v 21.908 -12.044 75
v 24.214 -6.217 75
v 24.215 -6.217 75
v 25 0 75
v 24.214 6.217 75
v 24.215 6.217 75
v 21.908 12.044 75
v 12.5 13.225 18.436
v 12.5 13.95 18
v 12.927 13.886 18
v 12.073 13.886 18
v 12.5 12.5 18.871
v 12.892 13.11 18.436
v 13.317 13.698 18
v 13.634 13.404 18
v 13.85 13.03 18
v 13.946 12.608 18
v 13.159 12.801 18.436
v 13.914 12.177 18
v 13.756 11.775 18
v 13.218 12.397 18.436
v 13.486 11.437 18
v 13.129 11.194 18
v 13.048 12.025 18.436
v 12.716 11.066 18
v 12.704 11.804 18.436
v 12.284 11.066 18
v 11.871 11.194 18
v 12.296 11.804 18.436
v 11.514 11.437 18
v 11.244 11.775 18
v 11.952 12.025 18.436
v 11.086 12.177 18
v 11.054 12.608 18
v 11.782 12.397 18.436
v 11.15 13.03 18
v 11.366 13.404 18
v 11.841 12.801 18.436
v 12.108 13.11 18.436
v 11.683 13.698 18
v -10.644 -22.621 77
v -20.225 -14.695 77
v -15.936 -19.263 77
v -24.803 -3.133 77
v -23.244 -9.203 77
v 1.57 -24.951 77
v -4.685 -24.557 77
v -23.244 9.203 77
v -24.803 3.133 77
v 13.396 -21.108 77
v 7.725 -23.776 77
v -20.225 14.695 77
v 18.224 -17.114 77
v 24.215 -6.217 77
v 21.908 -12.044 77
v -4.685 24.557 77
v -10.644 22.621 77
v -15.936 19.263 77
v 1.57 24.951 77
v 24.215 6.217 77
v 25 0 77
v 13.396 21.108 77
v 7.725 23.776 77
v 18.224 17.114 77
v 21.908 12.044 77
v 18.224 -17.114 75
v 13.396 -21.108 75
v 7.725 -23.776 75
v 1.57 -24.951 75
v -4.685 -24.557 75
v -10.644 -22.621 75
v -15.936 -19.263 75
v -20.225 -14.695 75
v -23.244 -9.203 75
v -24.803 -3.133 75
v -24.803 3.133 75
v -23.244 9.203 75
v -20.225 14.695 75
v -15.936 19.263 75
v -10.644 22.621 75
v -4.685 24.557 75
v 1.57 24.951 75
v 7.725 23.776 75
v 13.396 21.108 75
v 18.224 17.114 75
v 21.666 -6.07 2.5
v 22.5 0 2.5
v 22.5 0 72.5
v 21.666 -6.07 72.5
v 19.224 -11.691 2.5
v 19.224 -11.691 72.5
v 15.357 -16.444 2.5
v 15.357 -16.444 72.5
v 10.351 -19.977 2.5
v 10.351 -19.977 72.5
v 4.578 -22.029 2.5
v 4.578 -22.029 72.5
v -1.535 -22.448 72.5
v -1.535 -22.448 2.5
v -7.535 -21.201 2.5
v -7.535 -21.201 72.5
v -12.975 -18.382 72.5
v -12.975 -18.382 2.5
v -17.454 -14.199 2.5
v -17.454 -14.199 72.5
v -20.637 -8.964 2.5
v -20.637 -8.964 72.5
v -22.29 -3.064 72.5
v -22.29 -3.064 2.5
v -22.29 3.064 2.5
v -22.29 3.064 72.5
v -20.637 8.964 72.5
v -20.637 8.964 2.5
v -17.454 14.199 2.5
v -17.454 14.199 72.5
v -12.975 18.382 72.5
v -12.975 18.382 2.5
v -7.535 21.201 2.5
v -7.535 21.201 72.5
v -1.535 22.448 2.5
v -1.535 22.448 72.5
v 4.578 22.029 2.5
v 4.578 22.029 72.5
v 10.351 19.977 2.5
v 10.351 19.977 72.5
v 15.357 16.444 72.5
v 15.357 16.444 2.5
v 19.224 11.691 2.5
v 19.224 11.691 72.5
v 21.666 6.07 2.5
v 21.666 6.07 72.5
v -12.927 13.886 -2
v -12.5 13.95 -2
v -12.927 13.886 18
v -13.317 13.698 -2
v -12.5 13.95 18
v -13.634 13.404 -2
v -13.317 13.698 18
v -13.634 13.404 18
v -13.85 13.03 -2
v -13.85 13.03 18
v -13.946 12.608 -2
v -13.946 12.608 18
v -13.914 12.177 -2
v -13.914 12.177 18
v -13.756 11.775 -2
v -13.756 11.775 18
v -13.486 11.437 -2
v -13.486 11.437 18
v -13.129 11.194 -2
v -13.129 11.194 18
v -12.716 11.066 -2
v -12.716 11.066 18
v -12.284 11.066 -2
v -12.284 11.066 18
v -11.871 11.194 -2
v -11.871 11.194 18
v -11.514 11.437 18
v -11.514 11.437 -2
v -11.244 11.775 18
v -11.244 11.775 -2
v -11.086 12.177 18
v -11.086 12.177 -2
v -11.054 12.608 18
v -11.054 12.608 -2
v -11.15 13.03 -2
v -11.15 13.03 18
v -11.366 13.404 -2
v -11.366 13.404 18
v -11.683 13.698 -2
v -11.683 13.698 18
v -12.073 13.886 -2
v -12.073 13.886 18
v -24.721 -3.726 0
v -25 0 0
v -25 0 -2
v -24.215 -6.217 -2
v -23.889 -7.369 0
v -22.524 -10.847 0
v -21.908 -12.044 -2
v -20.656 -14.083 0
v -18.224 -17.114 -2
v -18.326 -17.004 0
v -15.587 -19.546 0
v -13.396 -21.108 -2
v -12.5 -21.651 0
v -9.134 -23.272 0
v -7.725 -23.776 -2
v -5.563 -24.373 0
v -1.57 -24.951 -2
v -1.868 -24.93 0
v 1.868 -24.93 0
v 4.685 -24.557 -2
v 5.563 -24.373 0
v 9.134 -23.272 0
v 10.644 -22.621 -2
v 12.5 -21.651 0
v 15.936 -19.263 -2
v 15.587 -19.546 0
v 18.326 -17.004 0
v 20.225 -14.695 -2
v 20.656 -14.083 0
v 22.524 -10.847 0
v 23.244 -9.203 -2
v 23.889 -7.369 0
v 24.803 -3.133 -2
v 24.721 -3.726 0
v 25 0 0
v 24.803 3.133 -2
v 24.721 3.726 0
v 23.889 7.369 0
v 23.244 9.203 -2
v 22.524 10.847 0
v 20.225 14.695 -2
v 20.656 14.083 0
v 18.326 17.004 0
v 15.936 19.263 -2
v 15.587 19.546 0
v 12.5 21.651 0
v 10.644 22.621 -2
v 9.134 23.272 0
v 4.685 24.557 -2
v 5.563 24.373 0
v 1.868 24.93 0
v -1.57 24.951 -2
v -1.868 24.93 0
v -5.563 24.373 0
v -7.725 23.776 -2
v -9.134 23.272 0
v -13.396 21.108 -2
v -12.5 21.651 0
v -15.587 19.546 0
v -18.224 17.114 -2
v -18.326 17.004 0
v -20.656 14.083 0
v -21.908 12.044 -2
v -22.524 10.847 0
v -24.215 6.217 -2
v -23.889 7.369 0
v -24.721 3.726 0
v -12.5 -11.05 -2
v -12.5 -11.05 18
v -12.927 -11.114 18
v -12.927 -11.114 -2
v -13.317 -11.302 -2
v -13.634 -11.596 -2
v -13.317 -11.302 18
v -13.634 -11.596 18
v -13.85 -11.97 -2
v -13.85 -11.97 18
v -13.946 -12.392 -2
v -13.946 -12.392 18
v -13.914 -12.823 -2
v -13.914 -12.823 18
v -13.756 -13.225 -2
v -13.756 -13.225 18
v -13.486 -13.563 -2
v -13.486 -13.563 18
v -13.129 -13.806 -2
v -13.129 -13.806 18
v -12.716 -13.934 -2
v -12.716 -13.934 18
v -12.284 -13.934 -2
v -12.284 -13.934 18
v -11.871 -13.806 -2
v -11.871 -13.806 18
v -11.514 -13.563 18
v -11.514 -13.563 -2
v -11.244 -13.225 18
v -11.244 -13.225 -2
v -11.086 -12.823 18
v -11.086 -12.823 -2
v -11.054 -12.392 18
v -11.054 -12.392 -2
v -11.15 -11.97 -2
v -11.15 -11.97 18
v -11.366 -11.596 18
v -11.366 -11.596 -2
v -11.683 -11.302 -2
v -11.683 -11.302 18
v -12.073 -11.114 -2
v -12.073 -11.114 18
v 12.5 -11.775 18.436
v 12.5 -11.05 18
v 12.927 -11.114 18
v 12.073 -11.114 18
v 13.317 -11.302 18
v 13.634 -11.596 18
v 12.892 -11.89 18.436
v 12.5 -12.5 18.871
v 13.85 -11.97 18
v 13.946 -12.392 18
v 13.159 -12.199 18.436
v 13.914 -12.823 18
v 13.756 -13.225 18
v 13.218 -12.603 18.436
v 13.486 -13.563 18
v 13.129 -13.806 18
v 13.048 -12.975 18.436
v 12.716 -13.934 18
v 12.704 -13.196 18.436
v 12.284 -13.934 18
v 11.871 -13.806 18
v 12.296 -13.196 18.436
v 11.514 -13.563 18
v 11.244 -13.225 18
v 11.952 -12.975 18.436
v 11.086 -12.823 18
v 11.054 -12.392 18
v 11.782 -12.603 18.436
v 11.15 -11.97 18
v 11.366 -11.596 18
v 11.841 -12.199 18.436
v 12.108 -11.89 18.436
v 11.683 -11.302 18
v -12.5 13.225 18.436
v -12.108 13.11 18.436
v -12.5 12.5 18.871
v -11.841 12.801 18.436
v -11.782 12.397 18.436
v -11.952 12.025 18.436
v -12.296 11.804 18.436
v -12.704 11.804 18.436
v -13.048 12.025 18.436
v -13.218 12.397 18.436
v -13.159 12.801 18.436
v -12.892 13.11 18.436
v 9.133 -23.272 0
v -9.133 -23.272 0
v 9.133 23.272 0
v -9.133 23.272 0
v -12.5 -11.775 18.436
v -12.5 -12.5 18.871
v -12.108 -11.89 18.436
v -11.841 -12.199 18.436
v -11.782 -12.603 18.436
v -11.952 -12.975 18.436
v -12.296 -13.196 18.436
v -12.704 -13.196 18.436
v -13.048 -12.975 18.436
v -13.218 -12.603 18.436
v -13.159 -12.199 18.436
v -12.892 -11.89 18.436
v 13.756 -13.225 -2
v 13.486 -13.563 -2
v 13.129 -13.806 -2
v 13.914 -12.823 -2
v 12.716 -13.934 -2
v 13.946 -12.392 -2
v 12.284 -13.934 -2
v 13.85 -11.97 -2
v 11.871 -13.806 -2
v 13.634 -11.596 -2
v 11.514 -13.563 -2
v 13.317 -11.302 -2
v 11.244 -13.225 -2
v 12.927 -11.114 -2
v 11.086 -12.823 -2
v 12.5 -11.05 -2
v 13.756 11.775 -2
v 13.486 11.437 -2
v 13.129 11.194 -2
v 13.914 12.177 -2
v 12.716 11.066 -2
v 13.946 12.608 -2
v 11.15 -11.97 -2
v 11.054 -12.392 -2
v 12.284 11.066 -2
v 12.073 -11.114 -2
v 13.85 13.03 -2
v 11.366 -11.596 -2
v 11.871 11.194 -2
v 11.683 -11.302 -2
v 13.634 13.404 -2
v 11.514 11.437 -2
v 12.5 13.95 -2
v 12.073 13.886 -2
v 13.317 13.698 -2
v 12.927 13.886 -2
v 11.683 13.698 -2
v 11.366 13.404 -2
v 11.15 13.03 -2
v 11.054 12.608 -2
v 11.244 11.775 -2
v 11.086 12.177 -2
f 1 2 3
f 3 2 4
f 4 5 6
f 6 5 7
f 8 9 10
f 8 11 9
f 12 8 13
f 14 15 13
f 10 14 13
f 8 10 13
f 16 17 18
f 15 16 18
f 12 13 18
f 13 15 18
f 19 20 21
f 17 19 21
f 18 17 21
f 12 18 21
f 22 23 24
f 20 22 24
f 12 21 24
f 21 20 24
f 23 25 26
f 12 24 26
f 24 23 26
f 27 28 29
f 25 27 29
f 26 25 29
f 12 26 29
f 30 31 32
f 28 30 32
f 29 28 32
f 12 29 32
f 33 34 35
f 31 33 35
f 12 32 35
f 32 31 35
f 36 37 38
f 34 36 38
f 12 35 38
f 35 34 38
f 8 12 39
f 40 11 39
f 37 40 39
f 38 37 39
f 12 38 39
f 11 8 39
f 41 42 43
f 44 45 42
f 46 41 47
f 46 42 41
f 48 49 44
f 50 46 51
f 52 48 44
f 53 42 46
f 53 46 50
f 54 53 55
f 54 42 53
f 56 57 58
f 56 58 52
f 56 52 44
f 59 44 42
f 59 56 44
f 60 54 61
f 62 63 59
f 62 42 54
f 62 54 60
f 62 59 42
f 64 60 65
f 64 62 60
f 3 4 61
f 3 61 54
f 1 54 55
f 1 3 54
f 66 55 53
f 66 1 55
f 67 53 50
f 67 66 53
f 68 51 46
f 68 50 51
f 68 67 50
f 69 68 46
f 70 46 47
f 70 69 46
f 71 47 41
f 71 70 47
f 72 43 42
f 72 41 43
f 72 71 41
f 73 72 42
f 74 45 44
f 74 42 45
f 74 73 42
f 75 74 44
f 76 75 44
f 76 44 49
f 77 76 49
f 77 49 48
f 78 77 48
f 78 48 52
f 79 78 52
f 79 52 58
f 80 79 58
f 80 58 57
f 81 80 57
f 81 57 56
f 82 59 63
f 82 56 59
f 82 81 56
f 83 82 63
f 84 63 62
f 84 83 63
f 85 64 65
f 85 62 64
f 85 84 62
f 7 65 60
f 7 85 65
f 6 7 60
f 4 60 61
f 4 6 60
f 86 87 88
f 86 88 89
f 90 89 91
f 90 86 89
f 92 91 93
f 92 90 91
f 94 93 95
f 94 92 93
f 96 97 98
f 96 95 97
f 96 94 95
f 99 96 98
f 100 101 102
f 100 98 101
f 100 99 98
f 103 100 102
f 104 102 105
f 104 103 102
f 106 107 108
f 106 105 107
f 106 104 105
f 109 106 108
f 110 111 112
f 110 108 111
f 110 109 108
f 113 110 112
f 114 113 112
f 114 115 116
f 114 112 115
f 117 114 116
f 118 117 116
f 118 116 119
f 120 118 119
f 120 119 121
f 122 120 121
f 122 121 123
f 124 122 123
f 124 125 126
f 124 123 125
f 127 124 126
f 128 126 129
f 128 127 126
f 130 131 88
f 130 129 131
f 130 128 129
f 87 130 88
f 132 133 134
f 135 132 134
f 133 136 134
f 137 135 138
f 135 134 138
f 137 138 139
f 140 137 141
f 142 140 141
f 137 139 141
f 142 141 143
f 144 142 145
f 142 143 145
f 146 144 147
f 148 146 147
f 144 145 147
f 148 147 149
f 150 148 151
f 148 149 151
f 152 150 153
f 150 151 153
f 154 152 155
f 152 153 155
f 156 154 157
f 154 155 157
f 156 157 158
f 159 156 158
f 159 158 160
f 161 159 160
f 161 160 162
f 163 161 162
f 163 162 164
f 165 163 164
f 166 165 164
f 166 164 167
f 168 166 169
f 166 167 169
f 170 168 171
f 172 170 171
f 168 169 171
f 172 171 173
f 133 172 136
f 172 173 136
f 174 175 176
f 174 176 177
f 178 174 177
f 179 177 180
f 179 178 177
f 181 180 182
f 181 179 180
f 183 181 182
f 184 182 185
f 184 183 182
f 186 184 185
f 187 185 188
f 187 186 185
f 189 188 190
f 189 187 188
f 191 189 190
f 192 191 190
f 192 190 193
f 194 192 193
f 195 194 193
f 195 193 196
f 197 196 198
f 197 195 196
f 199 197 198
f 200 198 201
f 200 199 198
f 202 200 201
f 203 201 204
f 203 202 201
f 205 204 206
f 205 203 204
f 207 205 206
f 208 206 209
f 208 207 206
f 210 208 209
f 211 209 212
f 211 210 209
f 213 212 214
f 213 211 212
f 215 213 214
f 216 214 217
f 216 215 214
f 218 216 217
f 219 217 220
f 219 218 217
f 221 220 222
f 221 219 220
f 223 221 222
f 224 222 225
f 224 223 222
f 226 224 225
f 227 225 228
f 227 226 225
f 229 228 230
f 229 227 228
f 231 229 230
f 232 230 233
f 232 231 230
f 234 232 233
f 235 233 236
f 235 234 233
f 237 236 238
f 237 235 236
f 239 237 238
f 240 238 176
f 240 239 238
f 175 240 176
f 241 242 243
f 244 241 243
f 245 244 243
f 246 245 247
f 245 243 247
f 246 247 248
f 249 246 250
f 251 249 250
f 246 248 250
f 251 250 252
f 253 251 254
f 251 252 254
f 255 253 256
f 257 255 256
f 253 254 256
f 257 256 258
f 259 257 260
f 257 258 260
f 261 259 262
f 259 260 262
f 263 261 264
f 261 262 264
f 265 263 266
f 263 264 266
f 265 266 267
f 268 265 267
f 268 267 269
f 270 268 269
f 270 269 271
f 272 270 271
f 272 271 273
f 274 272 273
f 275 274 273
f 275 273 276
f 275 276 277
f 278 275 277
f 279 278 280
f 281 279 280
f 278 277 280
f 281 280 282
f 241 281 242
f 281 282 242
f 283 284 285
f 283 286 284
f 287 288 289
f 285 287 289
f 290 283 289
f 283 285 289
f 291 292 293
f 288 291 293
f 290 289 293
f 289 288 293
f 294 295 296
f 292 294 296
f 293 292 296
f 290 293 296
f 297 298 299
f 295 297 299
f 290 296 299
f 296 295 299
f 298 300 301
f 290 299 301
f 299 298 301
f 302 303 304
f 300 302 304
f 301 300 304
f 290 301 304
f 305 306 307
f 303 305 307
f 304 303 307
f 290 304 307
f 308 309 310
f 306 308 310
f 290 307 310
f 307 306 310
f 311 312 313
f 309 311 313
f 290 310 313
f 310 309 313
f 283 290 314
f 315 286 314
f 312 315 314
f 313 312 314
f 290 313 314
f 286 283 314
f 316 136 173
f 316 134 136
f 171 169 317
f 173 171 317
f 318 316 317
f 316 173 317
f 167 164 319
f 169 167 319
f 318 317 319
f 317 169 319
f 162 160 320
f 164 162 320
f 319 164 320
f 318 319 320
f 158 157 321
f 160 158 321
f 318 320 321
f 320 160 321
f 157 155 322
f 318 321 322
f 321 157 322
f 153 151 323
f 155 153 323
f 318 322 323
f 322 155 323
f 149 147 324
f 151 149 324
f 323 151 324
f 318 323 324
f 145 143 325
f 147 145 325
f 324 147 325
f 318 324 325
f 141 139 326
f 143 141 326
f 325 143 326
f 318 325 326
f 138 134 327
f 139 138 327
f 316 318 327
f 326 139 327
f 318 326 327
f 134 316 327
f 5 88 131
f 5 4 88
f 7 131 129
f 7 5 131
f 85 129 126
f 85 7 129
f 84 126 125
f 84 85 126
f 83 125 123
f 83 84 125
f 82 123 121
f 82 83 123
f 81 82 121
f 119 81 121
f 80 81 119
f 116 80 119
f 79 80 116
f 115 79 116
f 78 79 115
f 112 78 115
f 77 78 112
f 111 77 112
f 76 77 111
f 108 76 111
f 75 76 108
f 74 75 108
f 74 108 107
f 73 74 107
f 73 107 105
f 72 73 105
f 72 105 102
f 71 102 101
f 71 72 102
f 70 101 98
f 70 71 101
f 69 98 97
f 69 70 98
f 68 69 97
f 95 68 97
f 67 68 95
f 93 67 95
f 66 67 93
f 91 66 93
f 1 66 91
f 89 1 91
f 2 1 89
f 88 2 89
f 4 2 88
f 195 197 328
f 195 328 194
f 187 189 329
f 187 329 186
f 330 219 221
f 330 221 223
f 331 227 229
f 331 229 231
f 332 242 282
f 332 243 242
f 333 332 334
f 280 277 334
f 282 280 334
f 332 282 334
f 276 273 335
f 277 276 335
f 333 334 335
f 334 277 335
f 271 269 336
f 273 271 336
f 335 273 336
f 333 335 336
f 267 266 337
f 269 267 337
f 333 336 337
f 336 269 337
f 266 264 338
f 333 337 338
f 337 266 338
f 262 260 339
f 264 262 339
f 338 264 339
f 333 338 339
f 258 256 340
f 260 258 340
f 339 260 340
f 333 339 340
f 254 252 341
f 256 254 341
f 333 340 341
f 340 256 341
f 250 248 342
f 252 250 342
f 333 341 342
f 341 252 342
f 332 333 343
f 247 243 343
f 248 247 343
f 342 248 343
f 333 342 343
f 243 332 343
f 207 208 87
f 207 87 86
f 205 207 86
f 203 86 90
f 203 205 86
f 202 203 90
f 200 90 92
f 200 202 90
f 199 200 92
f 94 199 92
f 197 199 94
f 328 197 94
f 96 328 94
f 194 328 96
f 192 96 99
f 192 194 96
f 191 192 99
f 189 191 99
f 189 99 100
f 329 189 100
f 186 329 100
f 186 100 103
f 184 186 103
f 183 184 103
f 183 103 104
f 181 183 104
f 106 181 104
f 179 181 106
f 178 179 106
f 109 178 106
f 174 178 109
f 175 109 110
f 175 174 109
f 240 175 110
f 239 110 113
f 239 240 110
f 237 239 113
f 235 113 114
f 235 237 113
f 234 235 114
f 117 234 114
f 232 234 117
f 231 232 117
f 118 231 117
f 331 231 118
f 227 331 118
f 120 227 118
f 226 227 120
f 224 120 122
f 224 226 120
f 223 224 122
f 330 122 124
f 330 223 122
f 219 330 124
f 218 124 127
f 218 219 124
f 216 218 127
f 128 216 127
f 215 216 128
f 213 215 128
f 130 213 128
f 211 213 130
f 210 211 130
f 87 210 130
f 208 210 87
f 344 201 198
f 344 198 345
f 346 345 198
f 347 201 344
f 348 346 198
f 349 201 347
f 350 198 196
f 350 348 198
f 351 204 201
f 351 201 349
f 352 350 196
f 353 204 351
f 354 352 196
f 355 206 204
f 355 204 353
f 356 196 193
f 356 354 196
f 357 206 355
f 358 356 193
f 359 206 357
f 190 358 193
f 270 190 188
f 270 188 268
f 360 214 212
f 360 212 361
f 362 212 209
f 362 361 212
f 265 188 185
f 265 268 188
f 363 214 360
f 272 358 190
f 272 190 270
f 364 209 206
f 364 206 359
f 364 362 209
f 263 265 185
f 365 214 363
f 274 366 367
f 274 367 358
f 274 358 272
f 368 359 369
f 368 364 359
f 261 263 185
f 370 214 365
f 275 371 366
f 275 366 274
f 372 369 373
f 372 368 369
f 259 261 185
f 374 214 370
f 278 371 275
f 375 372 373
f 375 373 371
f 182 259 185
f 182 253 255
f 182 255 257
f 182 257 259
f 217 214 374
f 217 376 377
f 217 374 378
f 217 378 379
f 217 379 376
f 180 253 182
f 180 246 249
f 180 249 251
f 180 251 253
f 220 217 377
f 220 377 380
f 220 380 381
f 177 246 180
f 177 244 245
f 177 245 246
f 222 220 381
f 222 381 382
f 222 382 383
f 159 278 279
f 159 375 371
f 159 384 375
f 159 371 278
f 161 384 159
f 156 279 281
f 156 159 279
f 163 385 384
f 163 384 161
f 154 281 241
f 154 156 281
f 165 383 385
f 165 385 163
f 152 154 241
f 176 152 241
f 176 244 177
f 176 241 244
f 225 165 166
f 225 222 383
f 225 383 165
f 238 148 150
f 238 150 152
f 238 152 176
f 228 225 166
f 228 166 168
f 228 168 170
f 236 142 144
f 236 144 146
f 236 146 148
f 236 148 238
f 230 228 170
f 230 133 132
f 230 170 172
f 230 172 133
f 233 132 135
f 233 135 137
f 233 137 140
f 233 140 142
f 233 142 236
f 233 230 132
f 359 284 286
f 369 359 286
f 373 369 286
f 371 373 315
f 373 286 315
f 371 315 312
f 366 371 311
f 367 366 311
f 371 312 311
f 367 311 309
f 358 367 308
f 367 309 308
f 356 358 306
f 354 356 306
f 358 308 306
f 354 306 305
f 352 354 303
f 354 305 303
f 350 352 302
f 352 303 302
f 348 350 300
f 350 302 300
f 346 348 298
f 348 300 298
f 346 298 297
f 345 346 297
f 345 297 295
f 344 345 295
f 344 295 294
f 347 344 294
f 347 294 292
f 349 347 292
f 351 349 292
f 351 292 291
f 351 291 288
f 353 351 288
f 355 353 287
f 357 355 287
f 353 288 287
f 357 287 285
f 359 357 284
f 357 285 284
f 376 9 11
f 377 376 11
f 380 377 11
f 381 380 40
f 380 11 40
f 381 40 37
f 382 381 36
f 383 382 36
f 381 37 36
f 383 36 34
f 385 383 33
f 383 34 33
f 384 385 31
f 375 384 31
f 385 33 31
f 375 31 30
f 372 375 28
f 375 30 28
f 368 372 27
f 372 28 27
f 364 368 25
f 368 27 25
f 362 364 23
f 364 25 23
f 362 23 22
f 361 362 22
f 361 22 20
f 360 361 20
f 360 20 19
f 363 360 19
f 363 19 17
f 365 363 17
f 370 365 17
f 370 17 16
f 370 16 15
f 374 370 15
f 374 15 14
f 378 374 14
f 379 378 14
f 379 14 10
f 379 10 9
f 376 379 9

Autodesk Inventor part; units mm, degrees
ref_plane "YZ Plane" through (0, 0, 0) normal (1, 0, 0) x (0, 1, 0)
ref_plane "XZ Plane" through (0, 0, 0) normal (0, 1, 0) x (-1, 0, 0)
ref_plane "XY Plane" through (0, 0, 0) normal (0, 0, 1) x (1, 0, 0)
sketch "Sketch1" plane through (0, 0, 0) normal (0, 0, 1) x (1, 0, 0)
  circle A0 centre (0, 0) radius 22.5
  point P0 (-12.5, 12.5)
  point P1 (12.5, 12.5)
  point P2 (12.5, -12.5)
  point P3 (-12.5, -12.5)
  dimension "d0" = 45
  dimension "d1" = 25
  dimension "d2" = 25
  dimension "d3" = 12.5
  dimension "d4" = 12.5
extrude "Extrusion1" add sketch "Sketch1" along normal blind 75
sketch "Sketch2" plane through (0, 0, 75) normal (0, 0, 1) x (1, 0, 0)
  circle A0 centre (0, 0) radius 22.5 projected
  circle A1 centre (0, 0) radius 25
  dimension "d7" = 2.5
extrude "Extrusion2" add sketch "Sketch2" along normal blind 2 contours A0 | A1
chamfer "Chamfer1" distance 2.5 angle 45 1 edges at (-22.5, 0, 75)
sketch "Sketch3" plane through (0, 0, 0) normal (0, 0, -1) x (-1, 0, 0)
  circle A0 centre (0, 0) radius 25 projected
extrude "Extrusion3" add sketch "Sketch3" along normal blind 2
chamfer "Chamfer2" distance 2.5 angle 45 1 edges at (-22.5, 0, 0)
sketch "Sketch4" plane through (0, 0, -2) normal (0, 0, -1) x (-1, 0, 0)
  circle A0 centre (0, 0) radius 25 projected
  point P0 (-12.5, 12.5)
  point P1 (12.5, 12.5)
  point P2 (12.5, -12.5)
  point P3 (-12.5, -12.5)
  dimension "d18" = 12.5
  dimension "d19" = 12.5
  dimension "d20" = 12.5
  dimension "d21" = 12.5
hole "Hole1" at (12.5, 12.5, -2) at (-12.5, 12.5, -2) at (-12.5, -12.5, -2) at (12.5, -12.5, -2) direction (0, 0, 1) diameter 2.9 depth 20 tip angle 118
equation "\"d2\" = d1"
equation "\"d3\" = 0.5 * d1"
equation "\"d4\" = d3"
equation "\"d19\" = d18"
equation "\"d20\" = d18"
equation "\"d21\" = d20"
properties part number "Filament Spool Holder" material "ABS Plastic"
